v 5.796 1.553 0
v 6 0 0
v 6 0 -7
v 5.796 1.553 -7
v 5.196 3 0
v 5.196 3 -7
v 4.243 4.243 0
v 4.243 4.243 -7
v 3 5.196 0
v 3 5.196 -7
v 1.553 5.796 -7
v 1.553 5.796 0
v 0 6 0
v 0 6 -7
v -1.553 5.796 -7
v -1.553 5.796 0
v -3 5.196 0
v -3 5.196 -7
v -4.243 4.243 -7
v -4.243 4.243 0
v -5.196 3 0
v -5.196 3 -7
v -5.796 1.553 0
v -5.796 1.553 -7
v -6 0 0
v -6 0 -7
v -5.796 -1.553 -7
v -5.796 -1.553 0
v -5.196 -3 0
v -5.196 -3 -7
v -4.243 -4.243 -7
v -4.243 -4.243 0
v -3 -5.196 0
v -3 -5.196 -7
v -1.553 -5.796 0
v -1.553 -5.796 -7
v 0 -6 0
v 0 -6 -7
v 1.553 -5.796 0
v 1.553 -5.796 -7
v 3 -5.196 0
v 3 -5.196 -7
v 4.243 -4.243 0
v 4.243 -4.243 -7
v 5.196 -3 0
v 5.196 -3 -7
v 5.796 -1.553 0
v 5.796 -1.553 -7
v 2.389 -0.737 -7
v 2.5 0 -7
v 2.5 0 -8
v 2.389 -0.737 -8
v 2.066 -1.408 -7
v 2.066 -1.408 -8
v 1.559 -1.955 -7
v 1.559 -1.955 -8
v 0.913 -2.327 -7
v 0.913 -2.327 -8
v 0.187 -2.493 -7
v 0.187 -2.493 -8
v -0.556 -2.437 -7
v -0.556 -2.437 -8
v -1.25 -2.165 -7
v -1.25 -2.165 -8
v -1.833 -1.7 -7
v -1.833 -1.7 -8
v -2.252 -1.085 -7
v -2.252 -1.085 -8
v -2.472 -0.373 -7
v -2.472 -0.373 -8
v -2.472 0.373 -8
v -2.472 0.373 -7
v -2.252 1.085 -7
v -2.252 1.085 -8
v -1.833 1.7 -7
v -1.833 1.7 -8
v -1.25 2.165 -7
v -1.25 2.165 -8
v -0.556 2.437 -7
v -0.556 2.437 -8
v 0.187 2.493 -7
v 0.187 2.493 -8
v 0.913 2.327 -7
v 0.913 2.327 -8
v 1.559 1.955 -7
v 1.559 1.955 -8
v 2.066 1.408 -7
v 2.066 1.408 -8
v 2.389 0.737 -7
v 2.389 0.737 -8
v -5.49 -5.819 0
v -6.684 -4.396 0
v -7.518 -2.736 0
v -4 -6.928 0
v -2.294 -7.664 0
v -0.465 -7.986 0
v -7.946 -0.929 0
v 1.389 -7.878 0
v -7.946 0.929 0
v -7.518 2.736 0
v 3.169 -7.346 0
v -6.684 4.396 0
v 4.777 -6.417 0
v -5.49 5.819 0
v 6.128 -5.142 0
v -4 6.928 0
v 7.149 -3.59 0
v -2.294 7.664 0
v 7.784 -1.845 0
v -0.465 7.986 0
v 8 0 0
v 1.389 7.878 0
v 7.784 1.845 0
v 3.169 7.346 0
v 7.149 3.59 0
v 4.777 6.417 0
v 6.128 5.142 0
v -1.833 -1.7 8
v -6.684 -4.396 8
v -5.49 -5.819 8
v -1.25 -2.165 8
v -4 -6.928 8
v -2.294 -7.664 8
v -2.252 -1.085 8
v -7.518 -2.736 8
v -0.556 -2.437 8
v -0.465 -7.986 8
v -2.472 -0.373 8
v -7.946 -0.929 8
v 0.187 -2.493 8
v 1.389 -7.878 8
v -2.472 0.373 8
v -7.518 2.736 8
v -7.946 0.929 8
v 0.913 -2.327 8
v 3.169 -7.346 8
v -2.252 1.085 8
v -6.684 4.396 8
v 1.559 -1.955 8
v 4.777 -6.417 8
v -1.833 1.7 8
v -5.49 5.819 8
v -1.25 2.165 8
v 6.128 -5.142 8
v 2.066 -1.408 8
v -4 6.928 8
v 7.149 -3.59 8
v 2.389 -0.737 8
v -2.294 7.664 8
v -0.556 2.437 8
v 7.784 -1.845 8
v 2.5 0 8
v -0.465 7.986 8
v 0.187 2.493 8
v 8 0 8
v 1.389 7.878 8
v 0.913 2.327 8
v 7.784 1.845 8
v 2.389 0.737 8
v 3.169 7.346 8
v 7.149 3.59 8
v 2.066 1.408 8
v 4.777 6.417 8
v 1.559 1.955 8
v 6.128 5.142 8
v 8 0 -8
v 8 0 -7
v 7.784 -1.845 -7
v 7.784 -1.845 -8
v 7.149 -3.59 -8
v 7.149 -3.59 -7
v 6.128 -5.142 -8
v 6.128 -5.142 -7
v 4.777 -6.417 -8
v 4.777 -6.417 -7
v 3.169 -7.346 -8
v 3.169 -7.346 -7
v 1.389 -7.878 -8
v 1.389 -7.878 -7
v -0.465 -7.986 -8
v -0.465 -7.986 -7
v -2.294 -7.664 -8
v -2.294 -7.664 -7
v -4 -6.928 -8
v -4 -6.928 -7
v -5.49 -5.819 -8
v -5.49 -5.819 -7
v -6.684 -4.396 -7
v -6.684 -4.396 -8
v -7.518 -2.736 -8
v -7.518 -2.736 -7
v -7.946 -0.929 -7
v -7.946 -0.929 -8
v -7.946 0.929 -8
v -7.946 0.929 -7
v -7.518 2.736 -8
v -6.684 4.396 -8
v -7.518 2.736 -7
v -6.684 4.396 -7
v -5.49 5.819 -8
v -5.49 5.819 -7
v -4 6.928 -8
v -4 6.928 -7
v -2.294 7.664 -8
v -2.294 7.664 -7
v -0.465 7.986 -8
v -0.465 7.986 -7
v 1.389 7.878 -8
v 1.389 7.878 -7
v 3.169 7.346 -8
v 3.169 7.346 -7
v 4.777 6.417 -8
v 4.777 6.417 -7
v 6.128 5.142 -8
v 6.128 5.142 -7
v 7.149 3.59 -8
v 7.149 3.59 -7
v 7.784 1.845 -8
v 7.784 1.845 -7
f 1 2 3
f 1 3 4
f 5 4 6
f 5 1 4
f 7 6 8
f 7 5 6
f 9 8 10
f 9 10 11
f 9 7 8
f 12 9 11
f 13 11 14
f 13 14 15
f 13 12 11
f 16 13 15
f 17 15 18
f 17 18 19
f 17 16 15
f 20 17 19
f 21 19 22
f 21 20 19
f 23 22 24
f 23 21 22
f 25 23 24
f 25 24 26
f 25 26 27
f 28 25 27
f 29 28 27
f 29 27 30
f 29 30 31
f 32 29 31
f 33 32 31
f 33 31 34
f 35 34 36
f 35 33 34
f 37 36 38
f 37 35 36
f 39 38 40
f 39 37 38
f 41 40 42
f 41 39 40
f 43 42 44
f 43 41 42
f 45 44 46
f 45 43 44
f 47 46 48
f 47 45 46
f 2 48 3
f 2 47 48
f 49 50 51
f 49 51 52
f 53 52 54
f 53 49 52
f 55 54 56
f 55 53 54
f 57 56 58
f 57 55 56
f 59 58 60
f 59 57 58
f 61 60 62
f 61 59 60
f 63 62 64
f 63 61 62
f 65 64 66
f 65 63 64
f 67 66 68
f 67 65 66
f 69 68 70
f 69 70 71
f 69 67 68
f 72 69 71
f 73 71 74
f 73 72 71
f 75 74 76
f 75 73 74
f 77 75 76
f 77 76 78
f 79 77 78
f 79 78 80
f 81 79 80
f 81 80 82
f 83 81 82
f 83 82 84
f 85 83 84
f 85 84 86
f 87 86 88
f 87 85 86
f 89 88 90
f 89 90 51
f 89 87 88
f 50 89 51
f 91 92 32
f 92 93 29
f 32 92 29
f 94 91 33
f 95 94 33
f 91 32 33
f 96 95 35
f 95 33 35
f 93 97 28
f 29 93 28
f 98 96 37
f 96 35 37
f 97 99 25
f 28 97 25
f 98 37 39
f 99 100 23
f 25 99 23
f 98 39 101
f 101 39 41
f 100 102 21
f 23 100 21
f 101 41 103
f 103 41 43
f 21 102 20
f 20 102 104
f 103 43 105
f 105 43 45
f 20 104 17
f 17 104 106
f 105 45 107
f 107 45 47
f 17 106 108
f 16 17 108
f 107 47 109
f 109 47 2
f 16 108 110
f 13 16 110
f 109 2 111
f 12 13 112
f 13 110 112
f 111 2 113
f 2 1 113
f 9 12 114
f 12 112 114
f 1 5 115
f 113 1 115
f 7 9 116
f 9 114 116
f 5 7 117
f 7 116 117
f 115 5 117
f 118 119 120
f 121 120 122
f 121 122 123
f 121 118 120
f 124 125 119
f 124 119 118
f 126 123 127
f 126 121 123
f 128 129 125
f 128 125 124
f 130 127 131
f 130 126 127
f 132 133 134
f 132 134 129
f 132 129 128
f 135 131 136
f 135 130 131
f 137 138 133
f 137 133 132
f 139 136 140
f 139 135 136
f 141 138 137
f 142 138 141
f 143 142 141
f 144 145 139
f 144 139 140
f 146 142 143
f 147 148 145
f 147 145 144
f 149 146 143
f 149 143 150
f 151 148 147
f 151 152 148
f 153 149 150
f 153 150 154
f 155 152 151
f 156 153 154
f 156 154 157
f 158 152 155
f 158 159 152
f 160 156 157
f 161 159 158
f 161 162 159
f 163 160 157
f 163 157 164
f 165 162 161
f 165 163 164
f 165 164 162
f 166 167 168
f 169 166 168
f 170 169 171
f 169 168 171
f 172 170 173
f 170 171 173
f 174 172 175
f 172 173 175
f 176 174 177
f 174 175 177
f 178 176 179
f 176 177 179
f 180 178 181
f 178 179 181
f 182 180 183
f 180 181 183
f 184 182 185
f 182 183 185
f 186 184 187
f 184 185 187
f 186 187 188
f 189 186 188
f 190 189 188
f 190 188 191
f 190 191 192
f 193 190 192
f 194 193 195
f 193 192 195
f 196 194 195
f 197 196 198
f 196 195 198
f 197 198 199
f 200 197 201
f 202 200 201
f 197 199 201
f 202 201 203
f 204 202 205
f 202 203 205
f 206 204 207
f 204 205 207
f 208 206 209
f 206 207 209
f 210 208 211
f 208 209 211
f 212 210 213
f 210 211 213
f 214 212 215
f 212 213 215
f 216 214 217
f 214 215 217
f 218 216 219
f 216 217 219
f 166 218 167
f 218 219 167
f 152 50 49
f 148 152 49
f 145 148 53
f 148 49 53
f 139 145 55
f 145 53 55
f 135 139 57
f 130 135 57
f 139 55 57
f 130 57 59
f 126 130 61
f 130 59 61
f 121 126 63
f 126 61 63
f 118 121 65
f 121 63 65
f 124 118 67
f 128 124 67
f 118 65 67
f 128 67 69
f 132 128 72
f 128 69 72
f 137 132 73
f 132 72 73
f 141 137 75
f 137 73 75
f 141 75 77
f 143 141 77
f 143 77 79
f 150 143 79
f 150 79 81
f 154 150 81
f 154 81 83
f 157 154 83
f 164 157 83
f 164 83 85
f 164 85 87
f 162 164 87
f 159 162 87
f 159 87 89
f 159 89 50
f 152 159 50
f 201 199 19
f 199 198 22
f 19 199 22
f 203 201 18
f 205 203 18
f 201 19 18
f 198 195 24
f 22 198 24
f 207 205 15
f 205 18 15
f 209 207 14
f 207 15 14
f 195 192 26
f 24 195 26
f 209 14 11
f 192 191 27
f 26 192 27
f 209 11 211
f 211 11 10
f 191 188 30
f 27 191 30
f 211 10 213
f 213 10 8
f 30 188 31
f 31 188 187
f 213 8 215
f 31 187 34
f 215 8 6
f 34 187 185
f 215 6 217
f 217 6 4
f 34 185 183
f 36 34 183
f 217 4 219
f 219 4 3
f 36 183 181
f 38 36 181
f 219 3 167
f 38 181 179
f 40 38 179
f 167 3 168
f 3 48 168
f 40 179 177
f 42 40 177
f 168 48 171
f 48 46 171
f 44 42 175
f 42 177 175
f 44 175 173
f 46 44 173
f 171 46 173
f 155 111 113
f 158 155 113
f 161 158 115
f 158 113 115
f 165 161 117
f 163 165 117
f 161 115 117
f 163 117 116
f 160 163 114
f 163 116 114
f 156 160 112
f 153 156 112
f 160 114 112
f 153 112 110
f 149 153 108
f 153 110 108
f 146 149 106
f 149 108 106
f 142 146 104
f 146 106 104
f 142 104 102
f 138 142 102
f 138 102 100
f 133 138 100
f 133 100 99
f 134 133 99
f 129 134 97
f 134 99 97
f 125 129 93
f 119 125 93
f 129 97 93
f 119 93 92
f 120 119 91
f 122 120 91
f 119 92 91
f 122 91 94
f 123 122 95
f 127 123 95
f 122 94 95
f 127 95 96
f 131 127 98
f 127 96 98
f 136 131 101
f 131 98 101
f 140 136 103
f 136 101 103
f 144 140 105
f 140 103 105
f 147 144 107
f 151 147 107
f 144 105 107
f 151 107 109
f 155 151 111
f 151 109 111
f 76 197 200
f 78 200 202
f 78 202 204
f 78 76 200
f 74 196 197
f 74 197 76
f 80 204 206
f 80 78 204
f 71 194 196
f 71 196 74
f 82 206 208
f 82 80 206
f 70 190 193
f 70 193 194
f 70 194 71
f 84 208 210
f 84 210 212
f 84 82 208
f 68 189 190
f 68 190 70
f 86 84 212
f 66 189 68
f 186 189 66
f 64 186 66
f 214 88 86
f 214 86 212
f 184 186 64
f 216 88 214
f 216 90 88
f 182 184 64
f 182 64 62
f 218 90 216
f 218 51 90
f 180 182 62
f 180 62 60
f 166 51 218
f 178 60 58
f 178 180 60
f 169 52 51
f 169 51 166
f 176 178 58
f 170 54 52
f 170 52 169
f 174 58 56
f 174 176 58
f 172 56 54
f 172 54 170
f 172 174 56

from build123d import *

# Parameters (mm, degrees)
F0_R     = 8
F0_R_2   = 6
F1_DEPTH = 8
F2_DEPTH = 7
F3_R     = 8
F3_R_2   = 6
F3_R_3   = 2.5
F4_DEPTH = 1
F5_DEPTH = 15.001


# Not quite as in the source:
# - a feature names something its author has since deleted; it is built from what else it names


with BuildPart() as f1:
    # F0 (on Top) → F1 (new body)
    with BuildSketch(Plane.XY):
        Circle(F0_R)
        Circle(F0_R_2, mode=Mode.SUBTRACT)
        Circle(F0_R_2)
    extrude(amount=F1_DEPTH)

    # F0 (on Top) → F2 (join)
    with BuildSketch(Plane.XY):
        Circle(F0_R_2)
    extrude(amount=-F2_DEPTH)

    # F3 (on face) → F4 (join)
    with BuildSketch(Plane(origin=(0, 0, -7), x_dir=(1, 0, 0), z_dir=(0, 0, -1))):
        Circle(F3_R)
        Circle(F3_R_2, mode=Mode.SUBTRACT)
        Circle(F3_R_2)
        Circle(F3_R_3, mode=Mode.SUBTRACT)
    extrude(amount=F4_DEPTH)

    # F3 (on face) → F5 (cut, through all)
    with BuildSketch(Plane(origin=(0, 0, -7), x_dir=(1, 0, 0), z_dir=(0, 0, -1))):
        Circle(F3_R_3)
    extrude(amount=-F5_DEPTH, mode=Mode.SUBTRACT)


solid = f1.part
